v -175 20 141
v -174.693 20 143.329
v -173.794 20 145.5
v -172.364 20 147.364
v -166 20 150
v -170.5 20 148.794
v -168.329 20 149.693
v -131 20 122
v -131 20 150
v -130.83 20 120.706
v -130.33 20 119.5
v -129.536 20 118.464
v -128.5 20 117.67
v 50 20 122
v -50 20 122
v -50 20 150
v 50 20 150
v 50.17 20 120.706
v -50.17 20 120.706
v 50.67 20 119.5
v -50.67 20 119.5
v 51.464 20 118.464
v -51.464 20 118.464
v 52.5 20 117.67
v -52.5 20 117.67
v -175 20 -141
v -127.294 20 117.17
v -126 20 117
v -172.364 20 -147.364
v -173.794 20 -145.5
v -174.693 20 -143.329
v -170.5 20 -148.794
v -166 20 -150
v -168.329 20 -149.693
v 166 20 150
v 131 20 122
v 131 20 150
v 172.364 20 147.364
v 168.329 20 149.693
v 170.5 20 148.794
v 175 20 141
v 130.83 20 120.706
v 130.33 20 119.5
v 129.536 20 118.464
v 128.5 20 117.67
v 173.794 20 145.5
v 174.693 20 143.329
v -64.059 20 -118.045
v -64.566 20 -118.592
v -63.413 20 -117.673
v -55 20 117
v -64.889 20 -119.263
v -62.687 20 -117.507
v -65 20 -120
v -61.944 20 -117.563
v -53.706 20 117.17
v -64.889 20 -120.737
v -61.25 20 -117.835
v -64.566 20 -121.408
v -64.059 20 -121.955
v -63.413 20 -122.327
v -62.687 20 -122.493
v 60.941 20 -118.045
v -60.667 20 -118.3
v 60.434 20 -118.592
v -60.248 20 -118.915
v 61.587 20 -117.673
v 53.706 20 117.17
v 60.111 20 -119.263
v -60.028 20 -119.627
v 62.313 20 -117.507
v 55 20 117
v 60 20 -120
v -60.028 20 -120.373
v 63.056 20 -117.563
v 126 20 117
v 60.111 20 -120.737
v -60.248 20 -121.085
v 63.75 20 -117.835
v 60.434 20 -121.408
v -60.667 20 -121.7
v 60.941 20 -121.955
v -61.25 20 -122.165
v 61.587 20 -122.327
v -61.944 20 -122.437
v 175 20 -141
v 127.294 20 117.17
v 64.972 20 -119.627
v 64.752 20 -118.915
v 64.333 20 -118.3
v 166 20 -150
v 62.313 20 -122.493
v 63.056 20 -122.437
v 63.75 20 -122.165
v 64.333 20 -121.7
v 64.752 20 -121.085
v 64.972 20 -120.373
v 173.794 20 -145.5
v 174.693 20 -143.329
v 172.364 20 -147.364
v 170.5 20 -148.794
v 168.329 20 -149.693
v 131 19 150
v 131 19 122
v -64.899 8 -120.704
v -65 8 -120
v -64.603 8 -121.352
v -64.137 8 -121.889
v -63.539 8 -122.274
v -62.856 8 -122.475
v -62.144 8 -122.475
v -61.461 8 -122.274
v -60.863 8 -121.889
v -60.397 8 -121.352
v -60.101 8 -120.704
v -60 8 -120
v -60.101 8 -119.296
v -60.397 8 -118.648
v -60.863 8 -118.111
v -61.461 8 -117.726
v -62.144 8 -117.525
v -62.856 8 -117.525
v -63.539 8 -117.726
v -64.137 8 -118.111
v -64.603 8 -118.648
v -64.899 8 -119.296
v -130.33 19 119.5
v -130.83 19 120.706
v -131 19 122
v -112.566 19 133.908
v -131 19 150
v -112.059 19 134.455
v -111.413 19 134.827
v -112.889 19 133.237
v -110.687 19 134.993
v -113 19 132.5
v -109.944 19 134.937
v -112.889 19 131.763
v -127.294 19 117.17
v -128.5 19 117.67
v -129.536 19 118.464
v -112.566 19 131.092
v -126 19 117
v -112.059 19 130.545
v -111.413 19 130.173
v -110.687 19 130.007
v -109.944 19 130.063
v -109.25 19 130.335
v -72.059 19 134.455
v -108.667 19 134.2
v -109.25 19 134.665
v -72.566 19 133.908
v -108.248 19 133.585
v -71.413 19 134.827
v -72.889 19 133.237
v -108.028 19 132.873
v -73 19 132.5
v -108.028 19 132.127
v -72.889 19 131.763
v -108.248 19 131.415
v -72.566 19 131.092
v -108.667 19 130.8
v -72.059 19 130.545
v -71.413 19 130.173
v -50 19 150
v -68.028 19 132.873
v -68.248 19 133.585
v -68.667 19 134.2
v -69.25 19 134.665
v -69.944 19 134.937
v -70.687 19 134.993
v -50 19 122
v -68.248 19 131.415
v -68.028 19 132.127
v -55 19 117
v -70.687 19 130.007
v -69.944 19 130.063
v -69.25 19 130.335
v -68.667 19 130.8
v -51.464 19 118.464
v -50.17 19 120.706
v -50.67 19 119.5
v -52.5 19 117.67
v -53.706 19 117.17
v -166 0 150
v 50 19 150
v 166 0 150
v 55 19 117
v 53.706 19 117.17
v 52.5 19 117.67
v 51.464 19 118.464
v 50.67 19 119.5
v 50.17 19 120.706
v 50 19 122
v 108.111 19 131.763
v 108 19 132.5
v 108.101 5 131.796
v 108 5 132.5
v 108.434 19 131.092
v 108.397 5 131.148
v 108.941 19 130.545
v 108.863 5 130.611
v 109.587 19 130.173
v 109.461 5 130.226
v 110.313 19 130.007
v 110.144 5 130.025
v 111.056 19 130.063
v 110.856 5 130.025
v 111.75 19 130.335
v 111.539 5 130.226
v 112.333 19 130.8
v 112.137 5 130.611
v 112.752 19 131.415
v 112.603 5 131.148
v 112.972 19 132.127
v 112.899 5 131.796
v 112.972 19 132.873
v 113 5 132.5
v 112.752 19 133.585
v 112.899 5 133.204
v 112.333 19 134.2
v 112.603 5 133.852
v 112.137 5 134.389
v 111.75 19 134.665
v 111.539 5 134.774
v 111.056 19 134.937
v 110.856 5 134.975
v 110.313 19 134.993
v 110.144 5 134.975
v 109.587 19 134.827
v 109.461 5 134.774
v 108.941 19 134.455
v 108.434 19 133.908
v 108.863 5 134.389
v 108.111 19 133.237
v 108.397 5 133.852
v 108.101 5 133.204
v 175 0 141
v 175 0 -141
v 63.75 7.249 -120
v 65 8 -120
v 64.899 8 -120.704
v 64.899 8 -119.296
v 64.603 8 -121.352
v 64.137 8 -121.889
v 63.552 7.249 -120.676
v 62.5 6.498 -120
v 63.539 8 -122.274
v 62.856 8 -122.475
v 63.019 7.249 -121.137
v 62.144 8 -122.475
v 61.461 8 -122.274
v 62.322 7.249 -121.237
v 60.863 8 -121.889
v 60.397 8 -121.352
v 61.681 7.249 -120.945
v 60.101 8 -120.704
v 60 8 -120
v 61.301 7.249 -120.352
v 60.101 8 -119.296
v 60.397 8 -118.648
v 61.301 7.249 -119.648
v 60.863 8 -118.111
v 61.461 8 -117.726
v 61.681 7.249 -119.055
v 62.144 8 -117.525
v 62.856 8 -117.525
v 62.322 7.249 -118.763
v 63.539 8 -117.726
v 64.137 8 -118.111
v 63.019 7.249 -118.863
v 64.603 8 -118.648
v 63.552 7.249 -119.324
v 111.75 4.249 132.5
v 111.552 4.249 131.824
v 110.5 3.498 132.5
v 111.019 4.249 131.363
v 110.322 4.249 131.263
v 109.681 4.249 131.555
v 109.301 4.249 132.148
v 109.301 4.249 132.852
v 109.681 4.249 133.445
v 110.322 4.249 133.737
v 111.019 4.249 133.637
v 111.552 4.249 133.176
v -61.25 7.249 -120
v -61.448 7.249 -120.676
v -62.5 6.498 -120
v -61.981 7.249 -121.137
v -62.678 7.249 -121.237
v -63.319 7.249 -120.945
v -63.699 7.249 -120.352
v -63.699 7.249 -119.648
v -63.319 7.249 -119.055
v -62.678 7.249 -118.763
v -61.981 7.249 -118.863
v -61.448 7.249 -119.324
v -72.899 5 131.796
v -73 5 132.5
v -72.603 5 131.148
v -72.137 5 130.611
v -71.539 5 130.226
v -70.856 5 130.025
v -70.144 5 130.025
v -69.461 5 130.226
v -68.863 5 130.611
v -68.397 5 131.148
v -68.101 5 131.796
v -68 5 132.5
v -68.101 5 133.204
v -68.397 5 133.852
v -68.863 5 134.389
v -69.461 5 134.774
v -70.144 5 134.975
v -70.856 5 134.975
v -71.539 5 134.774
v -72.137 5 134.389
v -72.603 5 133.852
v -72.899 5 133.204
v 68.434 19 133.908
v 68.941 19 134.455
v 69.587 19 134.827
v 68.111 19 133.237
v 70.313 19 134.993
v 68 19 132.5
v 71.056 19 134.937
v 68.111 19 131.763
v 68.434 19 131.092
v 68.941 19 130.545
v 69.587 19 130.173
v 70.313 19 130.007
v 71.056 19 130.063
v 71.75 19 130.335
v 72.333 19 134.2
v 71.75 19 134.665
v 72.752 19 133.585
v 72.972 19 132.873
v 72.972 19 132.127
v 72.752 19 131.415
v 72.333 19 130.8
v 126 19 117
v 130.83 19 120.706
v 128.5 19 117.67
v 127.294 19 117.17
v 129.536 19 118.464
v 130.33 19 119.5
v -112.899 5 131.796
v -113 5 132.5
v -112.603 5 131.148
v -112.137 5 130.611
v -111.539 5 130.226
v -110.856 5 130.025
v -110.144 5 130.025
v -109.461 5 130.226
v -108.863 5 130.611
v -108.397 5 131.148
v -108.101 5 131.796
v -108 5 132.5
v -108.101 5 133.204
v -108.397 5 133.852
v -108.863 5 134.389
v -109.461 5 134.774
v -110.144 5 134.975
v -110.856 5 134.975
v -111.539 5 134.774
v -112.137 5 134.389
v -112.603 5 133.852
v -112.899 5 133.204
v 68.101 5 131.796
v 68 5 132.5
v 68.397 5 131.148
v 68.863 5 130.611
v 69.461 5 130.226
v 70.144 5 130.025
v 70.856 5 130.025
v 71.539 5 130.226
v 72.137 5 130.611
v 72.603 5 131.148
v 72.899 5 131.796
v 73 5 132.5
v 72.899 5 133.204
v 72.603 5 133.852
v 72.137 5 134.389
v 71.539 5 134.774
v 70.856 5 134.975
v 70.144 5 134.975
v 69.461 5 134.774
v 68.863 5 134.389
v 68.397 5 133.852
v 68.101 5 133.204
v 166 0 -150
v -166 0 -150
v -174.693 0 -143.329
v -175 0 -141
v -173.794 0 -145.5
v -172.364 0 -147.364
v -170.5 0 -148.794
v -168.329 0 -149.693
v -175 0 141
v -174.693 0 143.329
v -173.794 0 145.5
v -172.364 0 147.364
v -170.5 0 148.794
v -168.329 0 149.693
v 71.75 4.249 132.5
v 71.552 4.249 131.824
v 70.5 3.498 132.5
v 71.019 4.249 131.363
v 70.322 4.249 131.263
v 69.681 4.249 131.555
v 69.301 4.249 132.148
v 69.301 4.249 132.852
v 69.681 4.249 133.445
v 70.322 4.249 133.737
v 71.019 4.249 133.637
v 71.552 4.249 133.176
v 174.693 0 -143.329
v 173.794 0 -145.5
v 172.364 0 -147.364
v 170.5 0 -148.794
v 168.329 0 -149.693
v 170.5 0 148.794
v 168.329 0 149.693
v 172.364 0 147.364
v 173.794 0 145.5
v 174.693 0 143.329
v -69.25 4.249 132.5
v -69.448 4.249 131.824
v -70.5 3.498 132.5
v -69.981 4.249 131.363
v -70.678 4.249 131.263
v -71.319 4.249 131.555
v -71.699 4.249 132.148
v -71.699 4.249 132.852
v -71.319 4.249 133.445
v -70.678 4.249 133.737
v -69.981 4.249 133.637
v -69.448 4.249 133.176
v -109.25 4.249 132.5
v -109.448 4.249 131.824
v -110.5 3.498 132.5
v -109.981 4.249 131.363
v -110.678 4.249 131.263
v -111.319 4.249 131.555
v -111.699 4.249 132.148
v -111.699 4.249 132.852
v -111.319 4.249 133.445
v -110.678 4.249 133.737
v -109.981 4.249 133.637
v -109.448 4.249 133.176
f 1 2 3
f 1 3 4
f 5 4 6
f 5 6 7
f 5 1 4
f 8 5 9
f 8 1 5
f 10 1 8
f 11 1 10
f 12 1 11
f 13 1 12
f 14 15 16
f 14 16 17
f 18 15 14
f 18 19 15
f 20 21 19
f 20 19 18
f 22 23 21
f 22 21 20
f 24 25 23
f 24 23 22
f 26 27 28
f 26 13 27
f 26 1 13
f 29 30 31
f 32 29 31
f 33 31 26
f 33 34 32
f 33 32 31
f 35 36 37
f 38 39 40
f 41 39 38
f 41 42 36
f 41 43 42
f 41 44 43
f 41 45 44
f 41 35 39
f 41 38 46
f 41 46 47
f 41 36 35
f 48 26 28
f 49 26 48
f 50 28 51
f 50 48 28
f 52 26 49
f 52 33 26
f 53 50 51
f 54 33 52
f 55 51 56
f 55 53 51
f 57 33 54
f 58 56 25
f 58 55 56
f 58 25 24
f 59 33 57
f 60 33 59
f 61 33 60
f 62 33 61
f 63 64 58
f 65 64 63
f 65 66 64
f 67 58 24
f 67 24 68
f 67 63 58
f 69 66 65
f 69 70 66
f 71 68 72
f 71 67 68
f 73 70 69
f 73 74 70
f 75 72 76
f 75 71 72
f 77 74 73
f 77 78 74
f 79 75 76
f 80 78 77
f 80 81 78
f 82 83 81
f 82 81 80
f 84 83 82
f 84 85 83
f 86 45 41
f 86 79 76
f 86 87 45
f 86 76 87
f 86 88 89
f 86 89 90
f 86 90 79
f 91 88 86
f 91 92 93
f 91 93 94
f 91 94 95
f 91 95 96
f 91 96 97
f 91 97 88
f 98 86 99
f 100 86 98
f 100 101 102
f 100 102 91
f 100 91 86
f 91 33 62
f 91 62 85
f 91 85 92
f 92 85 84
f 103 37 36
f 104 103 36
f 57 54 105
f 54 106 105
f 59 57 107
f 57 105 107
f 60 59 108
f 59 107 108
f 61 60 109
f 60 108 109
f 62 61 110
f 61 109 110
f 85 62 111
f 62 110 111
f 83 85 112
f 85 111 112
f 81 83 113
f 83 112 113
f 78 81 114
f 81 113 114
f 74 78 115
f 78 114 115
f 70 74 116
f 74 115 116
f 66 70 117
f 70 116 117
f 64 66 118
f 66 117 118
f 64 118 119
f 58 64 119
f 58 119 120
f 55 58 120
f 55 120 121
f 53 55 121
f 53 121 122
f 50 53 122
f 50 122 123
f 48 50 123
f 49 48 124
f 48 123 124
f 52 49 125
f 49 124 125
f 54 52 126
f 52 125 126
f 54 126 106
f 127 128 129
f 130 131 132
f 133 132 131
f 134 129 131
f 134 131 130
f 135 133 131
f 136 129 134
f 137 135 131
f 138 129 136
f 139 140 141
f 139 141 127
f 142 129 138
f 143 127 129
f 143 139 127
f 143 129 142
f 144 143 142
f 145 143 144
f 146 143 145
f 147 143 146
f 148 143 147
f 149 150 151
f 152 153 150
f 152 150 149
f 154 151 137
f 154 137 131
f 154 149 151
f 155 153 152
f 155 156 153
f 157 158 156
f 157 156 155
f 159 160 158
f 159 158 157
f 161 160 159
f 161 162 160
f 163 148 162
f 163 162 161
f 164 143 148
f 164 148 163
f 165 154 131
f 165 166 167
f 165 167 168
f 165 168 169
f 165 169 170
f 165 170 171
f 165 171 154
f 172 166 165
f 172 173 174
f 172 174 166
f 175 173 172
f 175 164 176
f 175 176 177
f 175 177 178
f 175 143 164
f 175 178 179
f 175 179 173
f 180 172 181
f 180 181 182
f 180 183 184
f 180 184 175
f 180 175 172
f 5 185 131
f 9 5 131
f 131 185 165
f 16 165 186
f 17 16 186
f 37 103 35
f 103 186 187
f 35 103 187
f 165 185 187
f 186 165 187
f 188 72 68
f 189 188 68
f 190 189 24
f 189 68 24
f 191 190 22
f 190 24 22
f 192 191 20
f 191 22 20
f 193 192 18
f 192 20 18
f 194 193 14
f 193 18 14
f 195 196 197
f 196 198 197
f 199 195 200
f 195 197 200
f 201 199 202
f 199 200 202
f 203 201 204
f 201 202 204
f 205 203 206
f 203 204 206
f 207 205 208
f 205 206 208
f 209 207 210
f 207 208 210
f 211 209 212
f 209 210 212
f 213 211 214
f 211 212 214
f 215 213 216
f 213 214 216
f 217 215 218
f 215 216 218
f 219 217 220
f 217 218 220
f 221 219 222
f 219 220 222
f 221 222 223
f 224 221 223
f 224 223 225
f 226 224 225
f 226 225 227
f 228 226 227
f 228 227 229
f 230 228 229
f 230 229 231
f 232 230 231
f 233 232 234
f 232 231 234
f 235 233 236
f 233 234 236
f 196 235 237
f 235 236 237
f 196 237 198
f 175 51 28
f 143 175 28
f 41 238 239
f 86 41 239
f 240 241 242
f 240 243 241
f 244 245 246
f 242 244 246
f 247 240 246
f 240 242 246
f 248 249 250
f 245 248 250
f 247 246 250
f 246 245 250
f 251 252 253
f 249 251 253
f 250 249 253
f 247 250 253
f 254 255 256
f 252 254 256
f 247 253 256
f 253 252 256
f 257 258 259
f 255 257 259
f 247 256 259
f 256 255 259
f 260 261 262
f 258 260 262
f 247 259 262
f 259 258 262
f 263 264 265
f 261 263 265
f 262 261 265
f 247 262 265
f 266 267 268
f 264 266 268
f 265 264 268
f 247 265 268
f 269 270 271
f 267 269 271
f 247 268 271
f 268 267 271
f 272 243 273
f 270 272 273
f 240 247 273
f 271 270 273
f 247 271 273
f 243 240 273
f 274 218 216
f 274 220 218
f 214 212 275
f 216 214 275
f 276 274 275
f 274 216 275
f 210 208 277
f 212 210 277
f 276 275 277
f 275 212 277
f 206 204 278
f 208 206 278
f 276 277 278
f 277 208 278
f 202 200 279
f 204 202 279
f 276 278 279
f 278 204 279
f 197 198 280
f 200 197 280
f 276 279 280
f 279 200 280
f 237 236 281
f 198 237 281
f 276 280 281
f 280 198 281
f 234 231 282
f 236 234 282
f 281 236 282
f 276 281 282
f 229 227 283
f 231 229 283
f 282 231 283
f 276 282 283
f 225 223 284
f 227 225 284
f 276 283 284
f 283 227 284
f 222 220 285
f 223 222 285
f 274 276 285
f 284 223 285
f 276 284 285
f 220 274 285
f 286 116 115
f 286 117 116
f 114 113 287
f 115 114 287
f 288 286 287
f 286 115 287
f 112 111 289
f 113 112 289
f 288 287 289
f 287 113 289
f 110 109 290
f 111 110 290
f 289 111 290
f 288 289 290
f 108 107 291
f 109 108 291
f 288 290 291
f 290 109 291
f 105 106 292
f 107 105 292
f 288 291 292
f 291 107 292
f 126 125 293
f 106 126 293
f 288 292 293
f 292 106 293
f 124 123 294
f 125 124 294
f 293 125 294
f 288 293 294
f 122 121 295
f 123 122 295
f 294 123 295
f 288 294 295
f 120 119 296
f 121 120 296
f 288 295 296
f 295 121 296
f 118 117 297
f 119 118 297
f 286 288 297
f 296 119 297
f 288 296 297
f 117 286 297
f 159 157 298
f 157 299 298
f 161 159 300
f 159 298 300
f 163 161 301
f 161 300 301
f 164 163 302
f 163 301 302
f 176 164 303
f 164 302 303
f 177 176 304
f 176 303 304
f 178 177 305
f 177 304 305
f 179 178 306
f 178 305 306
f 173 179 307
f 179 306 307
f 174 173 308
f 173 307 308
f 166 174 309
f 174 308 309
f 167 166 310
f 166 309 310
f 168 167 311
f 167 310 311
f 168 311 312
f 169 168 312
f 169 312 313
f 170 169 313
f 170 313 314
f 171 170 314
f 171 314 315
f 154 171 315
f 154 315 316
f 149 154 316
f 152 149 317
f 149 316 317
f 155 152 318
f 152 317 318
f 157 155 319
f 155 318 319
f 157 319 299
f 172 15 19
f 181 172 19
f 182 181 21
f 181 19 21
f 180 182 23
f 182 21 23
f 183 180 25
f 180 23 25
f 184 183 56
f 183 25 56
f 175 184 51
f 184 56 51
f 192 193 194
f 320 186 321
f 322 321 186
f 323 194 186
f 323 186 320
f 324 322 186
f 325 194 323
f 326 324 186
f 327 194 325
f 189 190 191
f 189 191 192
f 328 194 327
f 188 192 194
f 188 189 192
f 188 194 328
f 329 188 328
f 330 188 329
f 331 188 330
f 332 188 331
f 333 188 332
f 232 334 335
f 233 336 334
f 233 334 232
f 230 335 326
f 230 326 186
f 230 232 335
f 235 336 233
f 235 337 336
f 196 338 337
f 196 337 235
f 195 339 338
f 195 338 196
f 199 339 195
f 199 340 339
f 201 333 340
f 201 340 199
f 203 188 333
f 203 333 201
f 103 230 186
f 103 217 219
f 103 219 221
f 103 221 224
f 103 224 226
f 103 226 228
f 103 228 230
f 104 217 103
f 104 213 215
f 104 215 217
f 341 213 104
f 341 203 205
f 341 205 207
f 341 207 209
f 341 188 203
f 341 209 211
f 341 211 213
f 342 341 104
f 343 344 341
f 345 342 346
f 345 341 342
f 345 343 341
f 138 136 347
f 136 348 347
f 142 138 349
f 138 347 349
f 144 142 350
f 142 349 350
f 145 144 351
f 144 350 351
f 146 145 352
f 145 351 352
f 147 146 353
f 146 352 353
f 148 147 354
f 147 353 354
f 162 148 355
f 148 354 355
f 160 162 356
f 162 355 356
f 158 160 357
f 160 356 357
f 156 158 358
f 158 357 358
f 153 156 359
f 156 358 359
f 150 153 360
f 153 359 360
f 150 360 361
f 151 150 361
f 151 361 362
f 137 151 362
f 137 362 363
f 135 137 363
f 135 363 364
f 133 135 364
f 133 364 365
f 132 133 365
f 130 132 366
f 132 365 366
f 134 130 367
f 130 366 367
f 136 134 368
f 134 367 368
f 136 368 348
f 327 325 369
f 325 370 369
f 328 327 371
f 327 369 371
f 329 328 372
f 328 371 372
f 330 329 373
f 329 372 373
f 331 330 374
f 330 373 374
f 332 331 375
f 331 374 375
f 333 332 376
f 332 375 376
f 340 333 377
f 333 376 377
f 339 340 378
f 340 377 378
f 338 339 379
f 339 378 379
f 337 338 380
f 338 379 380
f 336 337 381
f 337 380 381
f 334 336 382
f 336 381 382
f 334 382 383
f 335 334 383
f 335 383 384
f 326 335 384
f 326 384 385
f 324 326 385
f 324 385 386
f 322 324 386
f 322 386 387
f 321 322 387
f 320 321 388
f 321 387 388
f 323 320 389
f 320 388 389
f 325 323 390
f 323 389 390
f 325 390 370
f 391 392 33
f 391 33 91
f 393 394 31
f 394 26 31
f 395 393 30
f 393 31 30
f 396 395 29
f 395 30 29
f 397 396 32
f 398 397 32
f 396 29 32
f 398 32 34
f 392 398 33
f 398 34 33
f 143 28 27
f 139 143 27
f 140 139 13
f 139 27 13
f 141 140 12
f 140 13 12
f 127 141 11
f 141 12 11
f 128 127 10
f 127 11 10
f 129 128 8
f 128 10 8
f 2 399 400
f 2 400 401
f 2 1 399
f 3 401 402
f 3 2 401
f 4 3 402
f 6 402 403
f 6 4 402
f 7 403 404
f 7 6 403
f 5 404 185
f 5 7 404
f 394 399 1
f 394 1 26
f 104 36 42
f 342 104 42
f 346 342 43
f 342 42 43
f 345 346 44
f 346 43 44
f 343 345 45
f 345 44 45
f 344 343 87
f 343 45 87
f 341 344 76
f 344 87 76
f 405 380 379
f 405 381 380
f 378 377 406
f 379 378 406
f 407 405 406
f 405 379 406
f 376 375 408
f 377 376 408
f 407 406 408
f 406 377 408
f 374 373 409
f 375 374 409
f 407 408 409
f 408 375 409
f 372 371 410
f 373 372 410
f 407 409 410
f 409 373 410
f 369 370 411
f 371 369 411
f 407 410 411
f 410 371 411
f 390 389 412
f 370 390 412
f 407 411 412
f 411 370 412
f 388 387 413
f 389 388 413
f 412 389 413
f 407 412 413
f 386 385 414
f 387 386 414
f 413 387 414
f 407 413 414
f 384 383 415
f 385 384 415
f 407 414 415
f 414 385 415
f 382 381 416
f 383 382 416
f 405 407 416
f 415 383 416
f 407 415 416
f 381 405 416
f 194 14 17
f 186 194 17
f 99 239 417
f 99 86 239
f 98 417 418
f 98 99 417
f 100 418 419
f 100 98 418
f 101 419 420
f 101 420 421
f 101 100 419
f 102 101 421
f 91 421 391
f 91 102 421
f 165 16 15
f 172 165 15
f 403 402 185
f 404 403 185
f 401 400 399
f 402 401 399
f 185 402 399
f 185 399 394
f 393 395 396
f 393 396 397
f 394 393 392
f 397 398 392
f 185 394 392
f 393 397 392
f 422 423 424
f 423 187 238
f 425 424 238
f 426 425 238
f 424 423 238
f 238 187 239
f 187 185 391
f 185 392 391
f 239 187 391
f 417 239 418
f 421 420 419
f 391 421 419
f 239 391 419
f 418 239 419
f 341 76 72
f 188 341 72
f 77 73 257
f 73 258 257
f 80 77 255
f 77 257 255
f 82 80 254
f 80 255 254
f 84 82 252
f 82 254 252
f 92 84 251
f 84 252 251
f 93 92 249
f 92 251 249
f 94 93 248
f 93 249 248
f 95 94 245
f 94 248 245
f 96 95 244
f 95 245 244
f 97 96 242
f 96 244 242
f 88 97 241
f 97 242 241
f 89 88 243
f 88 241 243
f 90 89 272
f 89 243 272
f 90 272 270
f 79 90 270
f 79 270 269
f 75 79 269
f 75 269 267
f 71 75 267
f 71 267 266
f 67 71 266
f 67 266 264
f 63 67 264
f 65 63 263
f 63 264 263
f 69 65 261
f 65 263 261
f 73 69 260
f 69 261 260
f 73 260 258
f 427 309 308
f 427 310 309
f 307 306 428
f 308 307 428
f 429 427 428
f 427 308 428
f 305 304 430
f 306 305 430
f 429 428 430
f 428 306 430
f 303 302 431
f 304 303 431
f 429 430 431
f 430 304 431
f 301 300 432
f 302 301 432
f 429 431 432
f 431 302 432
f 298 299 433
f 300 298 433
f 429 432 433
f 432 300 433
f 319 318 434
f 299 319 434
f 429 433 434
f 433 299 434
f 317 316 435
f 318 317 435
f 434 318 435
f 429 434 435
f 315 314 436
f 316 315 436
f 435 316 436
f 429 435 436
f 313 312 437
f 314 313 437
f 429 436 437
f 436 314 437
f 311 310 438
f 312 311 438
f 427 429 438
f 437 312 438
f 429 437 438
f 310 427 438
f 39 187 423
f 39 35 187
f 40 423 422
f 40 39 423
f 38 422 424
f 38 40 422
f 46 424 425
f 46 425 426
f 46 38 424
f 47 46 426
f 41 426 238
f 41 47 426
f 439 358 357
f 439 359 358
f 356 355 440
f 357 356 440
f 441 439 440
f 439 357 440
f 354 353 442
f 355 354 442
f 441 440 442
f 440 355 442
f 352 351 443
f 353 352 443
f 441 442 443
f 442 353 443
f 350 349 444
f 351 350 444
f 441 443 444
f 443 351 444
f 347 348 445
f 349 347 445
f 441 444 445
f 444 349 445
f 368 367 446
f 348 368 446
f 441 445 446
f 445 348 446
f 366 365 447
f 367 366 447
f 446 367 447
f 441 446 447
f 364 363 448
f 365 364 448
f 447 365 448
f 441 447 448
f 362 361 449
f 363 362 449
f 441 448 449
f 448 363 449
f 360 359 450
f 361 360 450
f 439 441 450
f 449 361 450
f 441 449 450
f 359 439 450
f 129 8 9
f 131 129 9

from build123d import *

# Parameters (mm, degrees)
SKETCH_1_W             = 350
SKETCH_1_H             = 300
EXTRUDE_1_DEPTH        = 20
FILLET_1_R             = 9
CUT_EXTRUDE_1_DEPTH    = 1
HOLE_WIZARD_M6_1_D     = 5
HOLE_WIZARD_M6_1_DEPTH = 14
HOLE_WIZARD_M6_1_TIP   = 1.502151548
HOLE_WIZARD_M6_2_D     = 5
HOLE_WIZARD_M6_2_DEPTH = 12
HOLE_WIZARD_M6_2_TIP   = 1.502151548


with BuildPart() as part:
    # 스케치1 → 보스-돌출1 (new body)
    with BuildSketch(Plane(origin=(0, 0, 0), x_dir=(1, 0, 0), z_dir=(0, 1, 0))):
        Rectangle(SKETCH_1_W, SKETCH_1_H)
    extrude(amount=EXTRUDE_1_DEPTH)

    # 필렛1
    fillet_1_edges = [part.edges().sort_by_distance(p)[0] for p in [
        (175, 10, 150),
        (-175, 10, 150),
        (-175, 10, -150),
        (175, 10, -150),
    ]]
    fillet(fillet_1_edges, radius=FILLET_1_R)

    # 스케치2 → 컷-돌출1 (cut)
    with BuildSketch(Plane(origin=(0, 20, 0), x_dir=(1, 0, 0), z_dir=(0, 1, 0))):
        with BuildLine():
            Line((-131, -150), (-50, -150))
            Line((-50, -150), (-50, -122))
            ThreePointArc((-50, -122), (-51.464466094, -118.464466094), (-55, -117))
            Line((-55, -117), (-126, -117))
            ThreePointArc((-126, -117), (-129.535533906, -118.464466094), (-131, -122))
            Line((-131, -122), (-131, -150))
        make_face()
        with BuildLine():
            Line((50, -150), (131, -150))
            Line((131, -150), (131, -122))
            ThreePointArc((131, -122), (129.535533906, -118.464466094), (126, -117))
            Line((126, -117), (55, -117))
            ThreePointArc((55, -117), (51.464466094, -118.464466094), (50, -122))
            Line((50, -122), (50, -150))
        make_face()
    extrude(amount=-CUT_EXTRUDE_1_DEPTH, mode=Mode.SUBTRACT)

    # M6 나사 구멍1
    with Locations(Plane(origin=(0, 19, 0), x_dir=(1, 0, 0), z_dir=(0, 1, 0))):
        with Locations((-110.5, -132.5), (-70.5, -132.5), (70.5, -132.5), (110.5, -132.5)):
            Hole(HOLE_WIZARD_M6_1_D / 2, depth=HOLE_WIZARD_M6_1_DEPTH)
            with Locations((0, 0, -(HOLE_WIZARD_M6_1_DEPTH + HOLE_WIZARD_M6_1_TIP / 2))):  # 118° drill point
                Cone(0, HOLE_WIZARD_M6_1_D / 2, HOLE_WIZARD_M6_1_TIP, mode=Mode.SUBTRACT)

    # M6 나사 구멍2
    with Locations(Plane(origin=(0, 20, 0), x_dir=(1, 0, 0), z_dir=(0, 1, 0))):
        with Locations((-62.5, 120), (62.5, 120)):
            Hole(HOLE_WIZARD_M6_2_D / 2, depth=HOLE_WIZARD_M6_2_DEPTH)
            with Locations((0, 0, -(HOLE_WIZARD_M6_2_DEPTH + HOLE_WIZARD_M6_2_TIP / 2))):  # 118° drill point
                Cone(0, HOLE_WIZARD_M6_2_D / 2, HOLE_WIZARD_M6_2_TIP, mode=Mode.SUBTRACT)


solid = part.part
